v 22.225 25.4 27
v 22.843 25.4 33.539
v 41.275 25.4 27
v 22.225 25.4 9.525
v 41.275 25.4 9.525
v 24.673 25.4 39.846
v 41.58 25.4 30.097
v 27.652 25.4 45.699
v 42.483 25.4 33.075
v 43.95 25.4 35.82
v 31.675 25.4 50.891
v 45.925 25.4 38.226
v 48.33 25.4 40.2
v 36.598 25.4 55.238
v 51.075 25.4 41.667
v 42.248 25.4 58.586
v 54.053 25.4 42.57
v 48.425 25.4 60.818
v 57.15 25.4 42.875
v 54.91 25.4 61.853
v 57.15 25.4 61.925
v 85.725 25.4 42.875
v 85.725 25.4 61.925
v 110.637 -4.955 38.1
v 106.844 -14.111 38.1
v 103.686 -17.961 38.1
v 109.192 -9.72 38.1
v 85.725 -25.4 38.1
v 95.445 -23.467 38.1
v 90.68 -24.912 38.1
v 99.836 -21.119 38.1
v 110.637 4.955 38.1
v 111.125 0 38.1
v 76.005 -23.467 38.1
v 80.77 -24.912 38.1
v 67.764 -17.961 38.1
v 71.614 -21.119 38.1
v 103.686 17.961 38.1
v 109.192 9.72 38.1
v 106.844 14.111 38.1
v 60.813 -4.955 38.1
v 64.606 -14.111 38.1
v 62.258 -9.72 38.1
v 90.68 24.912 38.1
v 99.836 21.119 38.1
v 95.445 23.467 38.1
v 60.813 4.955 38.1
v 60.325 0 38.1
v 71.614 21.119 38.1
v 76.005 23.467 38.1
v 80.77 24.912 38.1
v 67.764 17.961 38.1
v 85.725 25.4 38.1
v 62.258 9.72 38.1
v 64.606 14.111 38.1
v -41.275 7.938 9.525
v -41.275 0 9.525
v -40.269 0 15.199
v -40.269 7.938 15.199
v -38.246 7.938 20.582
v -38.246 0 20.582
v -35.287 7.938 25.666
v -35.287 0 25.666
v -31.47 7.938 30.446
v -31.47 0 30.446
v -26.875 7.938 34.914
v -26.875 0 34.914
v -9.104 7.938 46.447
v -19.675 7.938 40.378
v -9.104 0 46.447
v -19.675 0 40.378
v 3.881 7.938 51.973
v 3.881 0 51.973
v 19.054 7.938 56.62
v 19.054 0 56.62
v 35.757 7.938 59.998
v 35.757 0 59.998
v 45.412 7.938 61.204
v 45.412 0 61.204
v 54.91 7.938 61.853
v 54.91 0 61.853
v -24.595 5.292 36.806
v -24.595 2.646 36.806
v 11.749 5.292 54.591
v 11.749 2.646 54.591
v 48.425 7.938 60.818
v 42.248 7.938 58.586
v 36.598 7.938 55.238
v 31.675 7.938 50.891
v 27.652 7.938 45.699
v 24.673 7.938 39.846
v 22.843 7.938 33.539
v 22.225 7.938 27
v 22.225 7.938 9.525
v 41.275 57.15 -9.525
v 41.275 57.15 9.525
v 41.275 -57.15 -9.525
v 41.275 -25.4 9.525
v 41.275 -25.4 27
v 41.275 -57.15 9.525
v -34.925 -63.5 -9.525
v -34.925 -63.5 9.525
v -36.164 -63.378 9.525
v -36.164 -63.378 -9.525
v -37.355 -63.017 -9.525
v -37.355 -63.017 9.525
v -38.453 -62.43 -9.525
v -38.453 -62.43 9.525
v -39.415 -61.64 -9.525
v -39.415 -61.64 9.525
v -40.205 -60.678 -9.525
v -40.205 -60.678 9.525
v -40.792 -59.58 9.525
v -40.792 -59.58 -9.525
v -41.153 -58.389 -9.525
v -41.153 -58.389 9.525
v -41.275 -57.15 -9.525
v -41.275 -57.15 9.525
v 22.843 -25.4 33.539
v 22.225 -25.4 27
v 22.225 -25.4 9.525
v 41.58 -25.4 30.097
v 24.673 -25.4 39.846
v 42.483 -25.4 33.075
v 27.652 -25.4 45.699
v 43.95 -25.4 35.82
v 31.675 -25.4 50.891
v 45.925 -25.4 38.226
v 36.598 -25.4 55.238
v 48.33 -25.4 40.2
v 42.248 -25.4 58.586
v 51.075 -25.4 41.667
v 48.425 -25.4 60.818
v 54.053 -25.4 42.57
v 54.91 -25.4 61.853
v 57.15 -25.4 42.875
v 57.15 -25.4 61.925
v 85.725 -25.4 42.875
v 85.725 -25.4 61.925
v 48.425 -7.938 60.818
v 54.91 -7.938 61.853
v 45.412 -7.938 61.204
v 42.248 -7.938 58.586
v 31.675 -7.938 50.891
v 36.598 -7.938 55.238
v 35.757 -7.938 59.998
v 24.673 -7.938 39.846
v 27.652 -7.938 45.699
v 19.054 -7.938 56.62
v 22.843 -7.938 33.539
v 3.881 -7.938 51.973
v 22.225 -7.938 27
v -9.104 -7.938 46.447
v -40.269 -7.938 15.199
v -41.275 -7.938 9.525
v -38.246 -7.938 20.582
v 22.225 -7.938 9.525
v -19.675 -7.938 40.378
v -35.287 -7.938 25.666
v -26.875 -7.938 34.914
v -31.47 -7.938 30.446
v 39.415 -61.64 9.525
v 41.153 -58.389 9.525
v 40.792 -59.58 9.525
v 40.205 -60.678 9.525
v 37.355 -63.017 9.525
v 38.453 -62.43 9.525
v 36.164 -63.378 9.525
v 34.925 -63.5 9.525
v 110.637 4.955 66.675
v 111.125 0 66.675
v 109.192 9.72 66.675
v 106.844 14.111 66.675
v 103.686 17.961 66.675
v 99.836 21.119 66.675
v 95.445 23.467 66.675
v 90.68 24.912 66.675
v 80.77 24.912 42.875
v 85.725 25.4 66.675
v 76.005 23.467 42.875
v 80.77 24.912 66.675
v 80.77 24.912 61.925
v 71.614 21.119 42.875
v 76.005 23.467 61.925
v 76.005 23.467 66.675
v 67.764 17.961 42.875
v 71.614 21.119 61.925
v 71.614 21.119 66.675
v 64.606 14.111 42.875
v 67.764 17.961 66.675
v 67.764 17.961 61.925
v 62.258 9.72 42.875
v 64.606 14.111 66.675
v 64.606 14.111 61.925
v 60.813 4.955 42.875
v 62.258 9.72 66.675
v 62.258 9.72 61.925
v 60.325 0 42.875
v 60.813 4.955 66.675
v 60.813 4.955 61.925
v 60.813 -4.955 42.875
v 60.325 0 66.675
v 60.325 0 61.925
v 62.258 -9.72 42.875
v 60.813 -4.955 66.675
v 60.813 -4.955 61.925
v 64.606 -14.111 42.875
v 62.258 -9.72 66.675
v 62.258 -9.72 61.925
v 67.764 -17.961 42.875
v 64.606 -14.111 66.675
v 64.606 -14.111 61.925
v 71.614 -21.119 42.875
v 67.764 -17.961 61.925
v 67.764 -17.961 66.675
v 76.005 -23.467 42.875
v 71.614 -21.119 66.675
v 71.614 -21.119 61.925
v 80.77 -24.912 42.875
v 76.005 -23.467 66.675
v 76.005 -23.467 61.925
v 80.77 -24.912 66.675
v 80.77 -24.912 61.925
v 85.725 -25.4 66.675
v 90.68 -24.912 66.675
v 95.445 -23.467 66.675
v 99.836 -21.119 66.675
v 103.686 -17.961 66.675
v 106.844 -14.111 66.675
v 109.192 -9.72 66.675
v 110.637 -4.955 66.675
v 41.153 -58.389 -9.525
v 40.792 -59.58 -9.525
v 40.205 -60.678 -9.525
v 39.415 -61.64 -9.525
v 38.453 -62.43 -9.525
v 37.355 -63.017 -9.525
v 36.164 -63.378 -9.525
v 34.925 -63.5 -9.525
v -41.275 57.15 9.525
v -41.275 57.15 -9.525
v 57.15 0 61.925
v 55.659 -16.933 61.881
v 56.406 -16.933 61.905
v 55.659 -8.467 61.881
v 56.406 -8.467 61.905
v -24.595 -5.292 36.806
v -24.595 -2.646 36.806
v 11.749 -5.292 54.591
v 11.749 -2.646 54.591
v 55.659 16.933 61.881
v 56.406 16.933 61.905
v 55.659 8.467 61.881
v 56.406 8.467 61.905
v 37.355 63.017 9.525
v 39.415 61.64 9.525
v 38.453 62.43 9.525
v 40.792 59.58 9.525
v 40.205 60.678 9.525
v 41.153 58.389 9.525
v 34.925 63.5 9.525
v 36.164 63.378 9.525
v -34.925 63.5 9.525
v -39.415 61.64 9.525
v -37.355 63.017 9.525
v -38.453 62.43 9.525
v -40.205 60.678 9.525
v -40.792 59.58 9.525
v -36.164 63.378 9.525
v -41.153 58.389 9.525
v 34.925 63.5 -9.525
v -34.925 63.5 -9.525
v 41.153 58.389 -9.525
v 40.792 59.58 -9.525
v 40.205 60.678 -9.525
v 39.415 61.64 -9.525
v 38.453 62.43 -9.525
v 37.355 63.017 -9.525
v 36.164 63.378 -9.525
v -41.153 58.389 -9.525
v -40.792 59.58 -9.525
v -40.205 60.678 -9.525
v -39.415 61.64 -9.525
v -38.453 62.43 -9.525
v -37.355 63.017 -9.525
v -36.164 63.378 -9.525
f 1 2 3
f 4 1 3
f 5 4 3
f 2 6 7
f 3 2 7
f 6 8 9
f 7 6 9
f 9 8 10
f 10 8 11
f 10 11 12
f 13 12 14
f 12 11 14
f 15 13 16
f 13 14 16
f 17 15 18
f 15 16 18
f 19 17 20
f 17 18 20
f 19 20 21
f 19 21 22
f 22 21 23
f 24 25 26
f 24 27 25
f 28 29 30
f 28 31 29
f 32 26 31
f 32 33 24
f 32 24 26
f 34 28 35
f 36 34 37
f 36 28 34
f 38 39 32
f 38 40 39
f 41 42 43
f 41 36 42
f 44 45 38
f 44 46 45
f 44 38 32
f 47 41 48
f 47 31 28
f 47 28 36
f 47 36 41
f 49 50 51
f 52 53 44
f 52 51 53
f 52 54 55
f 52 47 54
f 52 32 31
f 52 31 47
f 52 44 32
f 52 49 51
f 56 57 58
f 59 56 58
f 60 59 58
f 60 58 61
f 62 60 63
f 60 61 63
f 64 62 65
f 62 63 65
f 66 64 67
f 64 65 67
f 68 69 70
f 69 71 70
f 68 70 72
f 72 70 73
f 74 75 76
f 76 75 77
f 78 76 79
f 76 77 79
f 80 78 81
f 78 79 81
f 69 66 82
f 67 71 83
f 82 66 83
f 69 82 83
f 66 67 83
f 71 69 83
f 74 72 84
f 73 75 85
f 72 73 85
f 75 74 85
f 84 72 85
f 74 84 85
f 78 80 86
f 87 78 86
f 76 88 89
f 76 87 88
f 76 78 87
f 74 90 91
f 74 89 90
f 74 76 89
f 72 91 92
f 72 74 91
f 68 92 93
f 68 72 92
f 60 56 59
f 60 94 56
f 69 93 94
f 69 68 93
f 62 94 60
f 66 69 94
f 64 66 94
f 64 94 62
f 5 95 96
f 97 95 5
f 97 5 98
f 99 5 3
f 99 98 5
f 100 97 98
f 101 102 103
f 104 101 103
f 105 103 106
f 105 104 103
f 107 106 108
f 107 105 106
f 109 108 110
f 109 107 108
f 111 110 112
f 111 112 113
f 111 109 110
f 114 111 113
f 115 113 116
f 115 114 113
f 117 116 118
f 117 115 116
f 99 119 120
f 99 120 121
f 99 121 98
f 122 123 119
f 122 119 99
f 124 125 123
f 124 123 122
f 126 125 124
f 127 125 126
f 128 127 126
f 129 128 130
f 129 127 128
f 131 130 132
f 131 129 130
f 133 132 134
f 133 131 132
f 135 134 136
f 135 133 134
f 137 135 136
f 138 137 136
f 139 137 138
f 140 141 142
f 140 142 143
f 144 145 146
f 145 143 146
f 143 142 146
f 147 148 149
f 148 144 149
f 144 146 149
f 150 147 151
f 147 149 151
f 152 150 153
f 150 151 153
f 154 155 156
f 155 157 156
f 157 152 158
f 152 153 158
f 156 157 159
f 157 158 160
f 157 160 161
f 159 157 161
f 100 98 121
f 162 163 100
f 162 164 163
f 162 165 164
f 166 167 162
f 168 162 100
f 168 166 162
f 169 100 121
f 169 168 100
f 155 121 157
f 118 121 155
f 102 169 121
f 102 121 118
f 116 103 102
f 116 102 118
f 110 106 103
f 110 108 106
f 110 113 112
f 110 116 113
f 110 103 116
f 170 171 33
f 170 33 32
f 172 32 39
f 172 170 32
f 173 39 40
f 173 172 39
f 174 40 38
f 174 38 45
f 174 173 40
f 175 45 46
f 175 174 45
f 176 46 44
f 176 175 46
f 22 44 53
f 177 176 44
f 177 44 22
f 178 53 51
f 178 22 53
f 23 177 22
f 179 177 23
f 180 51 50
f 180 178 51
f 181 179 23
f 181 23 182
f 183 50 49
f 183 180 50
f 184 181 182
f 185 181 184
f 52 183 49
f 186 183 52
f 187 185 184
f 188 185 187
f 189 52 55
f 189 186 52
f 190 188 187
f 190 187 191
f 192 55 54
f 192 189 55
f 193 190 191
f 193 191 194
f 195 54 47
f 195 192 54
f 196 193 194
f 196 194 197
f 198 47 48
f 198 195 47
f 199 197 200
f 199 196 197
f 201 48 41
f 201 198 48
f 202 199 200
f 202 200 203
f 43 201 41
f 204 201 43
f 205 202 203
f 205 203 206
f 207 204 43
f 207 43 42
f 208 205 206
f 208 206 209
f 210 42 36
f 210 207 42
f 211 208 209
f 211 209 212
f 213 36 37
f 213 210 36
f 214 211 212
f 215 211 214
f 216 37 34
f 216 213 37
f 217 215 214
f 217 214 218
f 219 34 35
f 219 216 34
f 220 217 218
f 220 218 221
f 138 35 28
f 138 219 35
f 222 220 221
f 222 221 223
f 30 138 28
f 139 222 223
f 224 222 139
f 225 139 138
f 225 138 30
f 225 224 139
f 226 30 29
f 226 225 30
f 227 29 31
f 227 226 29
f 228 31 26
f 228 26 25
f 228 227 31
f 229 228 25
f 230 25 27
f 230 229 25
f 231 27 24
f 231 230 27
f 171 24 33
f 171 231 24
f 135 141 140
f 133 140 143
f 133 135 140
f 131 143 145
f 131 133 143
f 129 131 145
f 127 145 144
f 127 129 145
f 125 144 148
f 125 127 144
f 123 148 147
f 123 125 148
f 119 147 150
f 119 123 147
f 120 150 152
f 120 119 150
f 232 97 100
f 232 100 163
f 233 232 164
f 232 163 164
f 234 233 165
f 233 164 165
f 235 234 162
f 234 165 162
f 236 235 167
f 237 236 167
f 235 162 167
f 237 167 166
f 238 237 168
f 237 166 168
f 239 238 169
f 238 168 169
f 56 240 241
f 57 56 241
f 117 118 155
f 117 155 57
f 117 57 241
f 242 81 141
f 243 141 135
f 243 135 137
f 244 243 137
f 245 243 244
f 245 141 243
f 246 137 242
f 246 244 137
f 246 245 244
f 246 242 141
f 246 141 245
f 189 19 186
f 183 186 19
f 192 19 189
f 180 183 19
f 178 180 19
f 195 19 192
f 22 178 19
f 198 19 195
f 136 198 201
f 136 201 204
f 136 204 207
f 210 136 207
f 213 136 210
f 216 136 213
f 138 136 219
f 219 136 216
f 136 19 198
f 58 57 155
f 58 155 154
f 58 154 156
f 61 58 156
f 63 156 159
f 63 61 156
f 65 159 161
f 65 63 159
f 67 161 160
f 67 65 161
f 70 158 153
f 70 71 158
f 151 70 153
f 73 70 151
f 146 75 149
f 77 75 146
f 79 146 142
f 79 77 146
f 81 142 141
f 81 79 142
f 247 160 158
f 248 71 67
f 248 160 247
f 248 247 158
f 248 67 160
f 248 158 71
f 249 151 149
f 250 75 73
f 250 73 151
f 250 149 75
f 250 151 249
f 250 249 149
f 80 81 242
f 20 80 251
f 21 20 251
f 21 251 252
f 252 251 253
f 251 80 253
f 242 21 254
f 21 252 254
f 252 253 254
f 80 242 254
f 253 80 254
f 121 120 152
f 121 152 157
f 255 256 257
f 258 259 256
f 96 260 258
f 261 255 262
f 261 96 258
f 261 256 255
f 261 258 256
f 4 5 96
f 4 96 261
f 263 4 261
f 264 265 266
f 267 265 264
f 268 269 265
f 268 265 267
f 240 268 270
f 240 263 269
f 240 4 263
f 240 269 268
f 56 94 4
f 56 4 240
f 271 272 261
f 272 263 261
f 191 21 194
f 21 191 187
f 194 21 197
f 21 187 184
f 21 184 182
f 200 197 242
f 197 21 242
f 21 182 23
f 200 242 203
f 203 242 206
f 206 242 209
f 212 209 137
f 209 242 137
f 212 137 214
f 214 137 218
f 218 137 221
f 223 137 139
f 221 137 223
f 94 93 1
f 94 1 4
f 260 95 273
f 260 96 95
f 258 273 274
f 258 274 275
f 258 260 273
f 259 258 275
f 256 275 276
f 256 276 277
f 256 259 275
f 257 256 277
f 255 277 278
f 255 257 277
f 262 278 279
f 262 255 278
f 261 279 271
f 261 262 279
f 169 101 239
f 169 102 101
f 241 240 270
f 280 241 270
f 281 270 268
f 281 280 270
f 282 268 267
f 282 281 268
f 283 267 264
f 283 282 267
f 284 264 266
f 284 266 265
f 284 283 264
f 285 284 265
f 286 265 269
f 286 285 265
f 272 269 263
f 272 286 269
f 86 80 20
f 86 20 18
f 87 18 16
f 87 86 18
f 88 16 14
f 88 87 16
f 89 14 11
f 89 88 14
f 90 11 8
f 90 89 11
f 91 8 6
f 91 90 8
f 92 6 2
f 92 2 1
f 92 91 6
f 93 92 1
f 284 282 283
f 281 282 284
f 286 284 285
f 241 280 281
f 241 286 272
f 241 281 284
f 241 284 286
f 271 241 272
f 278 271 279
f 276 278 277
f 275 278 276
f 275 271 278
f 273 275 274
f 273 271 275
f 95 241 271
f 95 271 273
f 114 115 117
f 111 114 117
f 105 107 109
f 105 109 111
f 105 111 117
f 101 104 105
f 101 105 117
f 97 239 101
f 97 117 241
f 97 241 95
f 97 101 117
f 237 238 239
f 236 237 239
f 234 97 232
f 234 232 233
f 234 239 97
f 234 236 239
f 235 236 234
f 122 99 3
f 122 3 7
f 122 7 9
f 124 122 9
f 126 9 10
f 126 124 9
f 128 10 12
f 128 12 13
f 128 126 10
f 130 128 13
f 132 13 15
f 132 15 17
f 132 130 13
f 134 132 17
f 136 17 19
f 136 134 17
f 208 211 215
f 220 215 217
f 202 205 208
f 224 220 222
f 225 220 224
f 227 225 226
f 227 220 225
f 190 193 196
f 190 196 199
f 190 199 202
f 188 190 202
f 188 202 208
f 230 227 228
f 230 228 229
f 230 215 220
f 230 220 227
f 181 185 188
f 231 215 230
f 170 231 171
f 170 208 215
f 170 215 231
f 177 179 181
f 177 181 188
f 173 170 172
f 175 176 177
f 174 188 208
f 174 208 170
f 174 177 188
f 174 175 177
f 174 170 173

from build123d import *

# Parameters (mm, degrees)
F1_DEPTH = 63.5
F2_DEPTH = 25.4
F3_DEPTH = 7.9375
F0_W     = 25.4
F0_H     = 19.05
F4_DEPTH = 25.4
F6_R     = 6.35


with BuildPart() as f1:
    # F0 (on Front) → F1 (new body, symmetric)
    with BuildSketch(Plane.XZ):
        Polygon((-41.275, -9.525), (41.275, -9.525), (41.275, 9.525), (22.225, 9.525), (-41.275, 9.525), align=None)
    extrude(amount=F1_DEPTH, both=True)

    # F0 (on Front) → F2 (join, symmetric)
    with BuildSketch(Plane.XZ):
        with BuildLine():
            Line((22.225, 9.525), (41.275, 9.525))
            Line((41.275, 9.525), (41.275, 27.0002))
            ThreePointArc((41.275, 27.0002), (45.9246798487, 38.2255201513), (57.15, 42.8752))
            Line((57.15, 42.8752), (60.325, 42.8752))
            Line((60.325, 42.8752), (60.325, 61.9252))
            Line((60.325, 61.9252), (57.15, 61.9252))
            add(Edge.make_bspline(
                [(54.9104785197, 61.8533227947), (55.6599311663, 61.8827305791), (56.4065455523, 61.9066982117), (57.15, 61.9252)],
                knots=[109.5628960552, 109.5628960552, 109.5628960552, 109.5628960552, 111.5045361635, 111.5045361635, 111.5045361635, 111.5045361635], degree=3))
            ThreePointArc((54.9104785197, 61.8533227947), (31.67480704, 50.8909967354), (22.225, 27.0002))
            Line((22.225, 27.0002), (22.225, 9.525))
        make_face()
    extrude(amount=F2_DEPTH, both=True)

    # F0 (on Front) → F3 (join, symmetric)
    with BuildSketch(Plane.XZ):
        with BuildLine():
            add(Edge.make_bspline(
                [(-41.275, 9.525), (-38.7071358638, 41.2123762099), (12.620353756, 60.1938999086), (54.9104785197, 61.8533227947)],
                knots=[0, 0, 0, 0, 109.5628960552, 109.5628960552, 109.5628960552, 109.5628960552], degree=3))
            Line((-41.275, 9.525), (22.225, 9.525))
            Line((22.225, 9.525), (22.225, 27.0002))
            ThreePointArc((22.225, 27.0002), (31.67480704, 50.8909967354), (54.9104785197, 61.8533227947))
        make_face()
    extrude(amount=F3_DEPTH, both=True)

    # F0 (on Front) → F4 (join, symmetric)
    with BuildSketch(Plane.XZ):
        with Locations((73.025, 52.4002)):
            Rectangle(F0_W, F0_H)
    extrude(amount=F4_DEPTH, both=True)

    # F0 (on Front) → F5 (revolve)
    with BuildSketch(Plane.XZ):
        Polygon((85.725, 61.9252), (85.725, 42.8752), (85.725, 38.1), (111.125, 38.1), (111.125, 66.675), (85.725, 66.675), align=None)
    revolve(axis=Axis((85.725, 0, 52.3875), (0, 0, 1)))

    # F6
    f6_edges = [f1.edges().sort_by_distance(p)[0] for p in [
        (-41.275, -63.5, 0),
        (41.275, -63.5, 0),
        (41.275, 63.5, 0),
        (-41.275, 63.5, 0),
    ]]
    fillet(f6_edges, radius=F6_R)


solid = f1.part
